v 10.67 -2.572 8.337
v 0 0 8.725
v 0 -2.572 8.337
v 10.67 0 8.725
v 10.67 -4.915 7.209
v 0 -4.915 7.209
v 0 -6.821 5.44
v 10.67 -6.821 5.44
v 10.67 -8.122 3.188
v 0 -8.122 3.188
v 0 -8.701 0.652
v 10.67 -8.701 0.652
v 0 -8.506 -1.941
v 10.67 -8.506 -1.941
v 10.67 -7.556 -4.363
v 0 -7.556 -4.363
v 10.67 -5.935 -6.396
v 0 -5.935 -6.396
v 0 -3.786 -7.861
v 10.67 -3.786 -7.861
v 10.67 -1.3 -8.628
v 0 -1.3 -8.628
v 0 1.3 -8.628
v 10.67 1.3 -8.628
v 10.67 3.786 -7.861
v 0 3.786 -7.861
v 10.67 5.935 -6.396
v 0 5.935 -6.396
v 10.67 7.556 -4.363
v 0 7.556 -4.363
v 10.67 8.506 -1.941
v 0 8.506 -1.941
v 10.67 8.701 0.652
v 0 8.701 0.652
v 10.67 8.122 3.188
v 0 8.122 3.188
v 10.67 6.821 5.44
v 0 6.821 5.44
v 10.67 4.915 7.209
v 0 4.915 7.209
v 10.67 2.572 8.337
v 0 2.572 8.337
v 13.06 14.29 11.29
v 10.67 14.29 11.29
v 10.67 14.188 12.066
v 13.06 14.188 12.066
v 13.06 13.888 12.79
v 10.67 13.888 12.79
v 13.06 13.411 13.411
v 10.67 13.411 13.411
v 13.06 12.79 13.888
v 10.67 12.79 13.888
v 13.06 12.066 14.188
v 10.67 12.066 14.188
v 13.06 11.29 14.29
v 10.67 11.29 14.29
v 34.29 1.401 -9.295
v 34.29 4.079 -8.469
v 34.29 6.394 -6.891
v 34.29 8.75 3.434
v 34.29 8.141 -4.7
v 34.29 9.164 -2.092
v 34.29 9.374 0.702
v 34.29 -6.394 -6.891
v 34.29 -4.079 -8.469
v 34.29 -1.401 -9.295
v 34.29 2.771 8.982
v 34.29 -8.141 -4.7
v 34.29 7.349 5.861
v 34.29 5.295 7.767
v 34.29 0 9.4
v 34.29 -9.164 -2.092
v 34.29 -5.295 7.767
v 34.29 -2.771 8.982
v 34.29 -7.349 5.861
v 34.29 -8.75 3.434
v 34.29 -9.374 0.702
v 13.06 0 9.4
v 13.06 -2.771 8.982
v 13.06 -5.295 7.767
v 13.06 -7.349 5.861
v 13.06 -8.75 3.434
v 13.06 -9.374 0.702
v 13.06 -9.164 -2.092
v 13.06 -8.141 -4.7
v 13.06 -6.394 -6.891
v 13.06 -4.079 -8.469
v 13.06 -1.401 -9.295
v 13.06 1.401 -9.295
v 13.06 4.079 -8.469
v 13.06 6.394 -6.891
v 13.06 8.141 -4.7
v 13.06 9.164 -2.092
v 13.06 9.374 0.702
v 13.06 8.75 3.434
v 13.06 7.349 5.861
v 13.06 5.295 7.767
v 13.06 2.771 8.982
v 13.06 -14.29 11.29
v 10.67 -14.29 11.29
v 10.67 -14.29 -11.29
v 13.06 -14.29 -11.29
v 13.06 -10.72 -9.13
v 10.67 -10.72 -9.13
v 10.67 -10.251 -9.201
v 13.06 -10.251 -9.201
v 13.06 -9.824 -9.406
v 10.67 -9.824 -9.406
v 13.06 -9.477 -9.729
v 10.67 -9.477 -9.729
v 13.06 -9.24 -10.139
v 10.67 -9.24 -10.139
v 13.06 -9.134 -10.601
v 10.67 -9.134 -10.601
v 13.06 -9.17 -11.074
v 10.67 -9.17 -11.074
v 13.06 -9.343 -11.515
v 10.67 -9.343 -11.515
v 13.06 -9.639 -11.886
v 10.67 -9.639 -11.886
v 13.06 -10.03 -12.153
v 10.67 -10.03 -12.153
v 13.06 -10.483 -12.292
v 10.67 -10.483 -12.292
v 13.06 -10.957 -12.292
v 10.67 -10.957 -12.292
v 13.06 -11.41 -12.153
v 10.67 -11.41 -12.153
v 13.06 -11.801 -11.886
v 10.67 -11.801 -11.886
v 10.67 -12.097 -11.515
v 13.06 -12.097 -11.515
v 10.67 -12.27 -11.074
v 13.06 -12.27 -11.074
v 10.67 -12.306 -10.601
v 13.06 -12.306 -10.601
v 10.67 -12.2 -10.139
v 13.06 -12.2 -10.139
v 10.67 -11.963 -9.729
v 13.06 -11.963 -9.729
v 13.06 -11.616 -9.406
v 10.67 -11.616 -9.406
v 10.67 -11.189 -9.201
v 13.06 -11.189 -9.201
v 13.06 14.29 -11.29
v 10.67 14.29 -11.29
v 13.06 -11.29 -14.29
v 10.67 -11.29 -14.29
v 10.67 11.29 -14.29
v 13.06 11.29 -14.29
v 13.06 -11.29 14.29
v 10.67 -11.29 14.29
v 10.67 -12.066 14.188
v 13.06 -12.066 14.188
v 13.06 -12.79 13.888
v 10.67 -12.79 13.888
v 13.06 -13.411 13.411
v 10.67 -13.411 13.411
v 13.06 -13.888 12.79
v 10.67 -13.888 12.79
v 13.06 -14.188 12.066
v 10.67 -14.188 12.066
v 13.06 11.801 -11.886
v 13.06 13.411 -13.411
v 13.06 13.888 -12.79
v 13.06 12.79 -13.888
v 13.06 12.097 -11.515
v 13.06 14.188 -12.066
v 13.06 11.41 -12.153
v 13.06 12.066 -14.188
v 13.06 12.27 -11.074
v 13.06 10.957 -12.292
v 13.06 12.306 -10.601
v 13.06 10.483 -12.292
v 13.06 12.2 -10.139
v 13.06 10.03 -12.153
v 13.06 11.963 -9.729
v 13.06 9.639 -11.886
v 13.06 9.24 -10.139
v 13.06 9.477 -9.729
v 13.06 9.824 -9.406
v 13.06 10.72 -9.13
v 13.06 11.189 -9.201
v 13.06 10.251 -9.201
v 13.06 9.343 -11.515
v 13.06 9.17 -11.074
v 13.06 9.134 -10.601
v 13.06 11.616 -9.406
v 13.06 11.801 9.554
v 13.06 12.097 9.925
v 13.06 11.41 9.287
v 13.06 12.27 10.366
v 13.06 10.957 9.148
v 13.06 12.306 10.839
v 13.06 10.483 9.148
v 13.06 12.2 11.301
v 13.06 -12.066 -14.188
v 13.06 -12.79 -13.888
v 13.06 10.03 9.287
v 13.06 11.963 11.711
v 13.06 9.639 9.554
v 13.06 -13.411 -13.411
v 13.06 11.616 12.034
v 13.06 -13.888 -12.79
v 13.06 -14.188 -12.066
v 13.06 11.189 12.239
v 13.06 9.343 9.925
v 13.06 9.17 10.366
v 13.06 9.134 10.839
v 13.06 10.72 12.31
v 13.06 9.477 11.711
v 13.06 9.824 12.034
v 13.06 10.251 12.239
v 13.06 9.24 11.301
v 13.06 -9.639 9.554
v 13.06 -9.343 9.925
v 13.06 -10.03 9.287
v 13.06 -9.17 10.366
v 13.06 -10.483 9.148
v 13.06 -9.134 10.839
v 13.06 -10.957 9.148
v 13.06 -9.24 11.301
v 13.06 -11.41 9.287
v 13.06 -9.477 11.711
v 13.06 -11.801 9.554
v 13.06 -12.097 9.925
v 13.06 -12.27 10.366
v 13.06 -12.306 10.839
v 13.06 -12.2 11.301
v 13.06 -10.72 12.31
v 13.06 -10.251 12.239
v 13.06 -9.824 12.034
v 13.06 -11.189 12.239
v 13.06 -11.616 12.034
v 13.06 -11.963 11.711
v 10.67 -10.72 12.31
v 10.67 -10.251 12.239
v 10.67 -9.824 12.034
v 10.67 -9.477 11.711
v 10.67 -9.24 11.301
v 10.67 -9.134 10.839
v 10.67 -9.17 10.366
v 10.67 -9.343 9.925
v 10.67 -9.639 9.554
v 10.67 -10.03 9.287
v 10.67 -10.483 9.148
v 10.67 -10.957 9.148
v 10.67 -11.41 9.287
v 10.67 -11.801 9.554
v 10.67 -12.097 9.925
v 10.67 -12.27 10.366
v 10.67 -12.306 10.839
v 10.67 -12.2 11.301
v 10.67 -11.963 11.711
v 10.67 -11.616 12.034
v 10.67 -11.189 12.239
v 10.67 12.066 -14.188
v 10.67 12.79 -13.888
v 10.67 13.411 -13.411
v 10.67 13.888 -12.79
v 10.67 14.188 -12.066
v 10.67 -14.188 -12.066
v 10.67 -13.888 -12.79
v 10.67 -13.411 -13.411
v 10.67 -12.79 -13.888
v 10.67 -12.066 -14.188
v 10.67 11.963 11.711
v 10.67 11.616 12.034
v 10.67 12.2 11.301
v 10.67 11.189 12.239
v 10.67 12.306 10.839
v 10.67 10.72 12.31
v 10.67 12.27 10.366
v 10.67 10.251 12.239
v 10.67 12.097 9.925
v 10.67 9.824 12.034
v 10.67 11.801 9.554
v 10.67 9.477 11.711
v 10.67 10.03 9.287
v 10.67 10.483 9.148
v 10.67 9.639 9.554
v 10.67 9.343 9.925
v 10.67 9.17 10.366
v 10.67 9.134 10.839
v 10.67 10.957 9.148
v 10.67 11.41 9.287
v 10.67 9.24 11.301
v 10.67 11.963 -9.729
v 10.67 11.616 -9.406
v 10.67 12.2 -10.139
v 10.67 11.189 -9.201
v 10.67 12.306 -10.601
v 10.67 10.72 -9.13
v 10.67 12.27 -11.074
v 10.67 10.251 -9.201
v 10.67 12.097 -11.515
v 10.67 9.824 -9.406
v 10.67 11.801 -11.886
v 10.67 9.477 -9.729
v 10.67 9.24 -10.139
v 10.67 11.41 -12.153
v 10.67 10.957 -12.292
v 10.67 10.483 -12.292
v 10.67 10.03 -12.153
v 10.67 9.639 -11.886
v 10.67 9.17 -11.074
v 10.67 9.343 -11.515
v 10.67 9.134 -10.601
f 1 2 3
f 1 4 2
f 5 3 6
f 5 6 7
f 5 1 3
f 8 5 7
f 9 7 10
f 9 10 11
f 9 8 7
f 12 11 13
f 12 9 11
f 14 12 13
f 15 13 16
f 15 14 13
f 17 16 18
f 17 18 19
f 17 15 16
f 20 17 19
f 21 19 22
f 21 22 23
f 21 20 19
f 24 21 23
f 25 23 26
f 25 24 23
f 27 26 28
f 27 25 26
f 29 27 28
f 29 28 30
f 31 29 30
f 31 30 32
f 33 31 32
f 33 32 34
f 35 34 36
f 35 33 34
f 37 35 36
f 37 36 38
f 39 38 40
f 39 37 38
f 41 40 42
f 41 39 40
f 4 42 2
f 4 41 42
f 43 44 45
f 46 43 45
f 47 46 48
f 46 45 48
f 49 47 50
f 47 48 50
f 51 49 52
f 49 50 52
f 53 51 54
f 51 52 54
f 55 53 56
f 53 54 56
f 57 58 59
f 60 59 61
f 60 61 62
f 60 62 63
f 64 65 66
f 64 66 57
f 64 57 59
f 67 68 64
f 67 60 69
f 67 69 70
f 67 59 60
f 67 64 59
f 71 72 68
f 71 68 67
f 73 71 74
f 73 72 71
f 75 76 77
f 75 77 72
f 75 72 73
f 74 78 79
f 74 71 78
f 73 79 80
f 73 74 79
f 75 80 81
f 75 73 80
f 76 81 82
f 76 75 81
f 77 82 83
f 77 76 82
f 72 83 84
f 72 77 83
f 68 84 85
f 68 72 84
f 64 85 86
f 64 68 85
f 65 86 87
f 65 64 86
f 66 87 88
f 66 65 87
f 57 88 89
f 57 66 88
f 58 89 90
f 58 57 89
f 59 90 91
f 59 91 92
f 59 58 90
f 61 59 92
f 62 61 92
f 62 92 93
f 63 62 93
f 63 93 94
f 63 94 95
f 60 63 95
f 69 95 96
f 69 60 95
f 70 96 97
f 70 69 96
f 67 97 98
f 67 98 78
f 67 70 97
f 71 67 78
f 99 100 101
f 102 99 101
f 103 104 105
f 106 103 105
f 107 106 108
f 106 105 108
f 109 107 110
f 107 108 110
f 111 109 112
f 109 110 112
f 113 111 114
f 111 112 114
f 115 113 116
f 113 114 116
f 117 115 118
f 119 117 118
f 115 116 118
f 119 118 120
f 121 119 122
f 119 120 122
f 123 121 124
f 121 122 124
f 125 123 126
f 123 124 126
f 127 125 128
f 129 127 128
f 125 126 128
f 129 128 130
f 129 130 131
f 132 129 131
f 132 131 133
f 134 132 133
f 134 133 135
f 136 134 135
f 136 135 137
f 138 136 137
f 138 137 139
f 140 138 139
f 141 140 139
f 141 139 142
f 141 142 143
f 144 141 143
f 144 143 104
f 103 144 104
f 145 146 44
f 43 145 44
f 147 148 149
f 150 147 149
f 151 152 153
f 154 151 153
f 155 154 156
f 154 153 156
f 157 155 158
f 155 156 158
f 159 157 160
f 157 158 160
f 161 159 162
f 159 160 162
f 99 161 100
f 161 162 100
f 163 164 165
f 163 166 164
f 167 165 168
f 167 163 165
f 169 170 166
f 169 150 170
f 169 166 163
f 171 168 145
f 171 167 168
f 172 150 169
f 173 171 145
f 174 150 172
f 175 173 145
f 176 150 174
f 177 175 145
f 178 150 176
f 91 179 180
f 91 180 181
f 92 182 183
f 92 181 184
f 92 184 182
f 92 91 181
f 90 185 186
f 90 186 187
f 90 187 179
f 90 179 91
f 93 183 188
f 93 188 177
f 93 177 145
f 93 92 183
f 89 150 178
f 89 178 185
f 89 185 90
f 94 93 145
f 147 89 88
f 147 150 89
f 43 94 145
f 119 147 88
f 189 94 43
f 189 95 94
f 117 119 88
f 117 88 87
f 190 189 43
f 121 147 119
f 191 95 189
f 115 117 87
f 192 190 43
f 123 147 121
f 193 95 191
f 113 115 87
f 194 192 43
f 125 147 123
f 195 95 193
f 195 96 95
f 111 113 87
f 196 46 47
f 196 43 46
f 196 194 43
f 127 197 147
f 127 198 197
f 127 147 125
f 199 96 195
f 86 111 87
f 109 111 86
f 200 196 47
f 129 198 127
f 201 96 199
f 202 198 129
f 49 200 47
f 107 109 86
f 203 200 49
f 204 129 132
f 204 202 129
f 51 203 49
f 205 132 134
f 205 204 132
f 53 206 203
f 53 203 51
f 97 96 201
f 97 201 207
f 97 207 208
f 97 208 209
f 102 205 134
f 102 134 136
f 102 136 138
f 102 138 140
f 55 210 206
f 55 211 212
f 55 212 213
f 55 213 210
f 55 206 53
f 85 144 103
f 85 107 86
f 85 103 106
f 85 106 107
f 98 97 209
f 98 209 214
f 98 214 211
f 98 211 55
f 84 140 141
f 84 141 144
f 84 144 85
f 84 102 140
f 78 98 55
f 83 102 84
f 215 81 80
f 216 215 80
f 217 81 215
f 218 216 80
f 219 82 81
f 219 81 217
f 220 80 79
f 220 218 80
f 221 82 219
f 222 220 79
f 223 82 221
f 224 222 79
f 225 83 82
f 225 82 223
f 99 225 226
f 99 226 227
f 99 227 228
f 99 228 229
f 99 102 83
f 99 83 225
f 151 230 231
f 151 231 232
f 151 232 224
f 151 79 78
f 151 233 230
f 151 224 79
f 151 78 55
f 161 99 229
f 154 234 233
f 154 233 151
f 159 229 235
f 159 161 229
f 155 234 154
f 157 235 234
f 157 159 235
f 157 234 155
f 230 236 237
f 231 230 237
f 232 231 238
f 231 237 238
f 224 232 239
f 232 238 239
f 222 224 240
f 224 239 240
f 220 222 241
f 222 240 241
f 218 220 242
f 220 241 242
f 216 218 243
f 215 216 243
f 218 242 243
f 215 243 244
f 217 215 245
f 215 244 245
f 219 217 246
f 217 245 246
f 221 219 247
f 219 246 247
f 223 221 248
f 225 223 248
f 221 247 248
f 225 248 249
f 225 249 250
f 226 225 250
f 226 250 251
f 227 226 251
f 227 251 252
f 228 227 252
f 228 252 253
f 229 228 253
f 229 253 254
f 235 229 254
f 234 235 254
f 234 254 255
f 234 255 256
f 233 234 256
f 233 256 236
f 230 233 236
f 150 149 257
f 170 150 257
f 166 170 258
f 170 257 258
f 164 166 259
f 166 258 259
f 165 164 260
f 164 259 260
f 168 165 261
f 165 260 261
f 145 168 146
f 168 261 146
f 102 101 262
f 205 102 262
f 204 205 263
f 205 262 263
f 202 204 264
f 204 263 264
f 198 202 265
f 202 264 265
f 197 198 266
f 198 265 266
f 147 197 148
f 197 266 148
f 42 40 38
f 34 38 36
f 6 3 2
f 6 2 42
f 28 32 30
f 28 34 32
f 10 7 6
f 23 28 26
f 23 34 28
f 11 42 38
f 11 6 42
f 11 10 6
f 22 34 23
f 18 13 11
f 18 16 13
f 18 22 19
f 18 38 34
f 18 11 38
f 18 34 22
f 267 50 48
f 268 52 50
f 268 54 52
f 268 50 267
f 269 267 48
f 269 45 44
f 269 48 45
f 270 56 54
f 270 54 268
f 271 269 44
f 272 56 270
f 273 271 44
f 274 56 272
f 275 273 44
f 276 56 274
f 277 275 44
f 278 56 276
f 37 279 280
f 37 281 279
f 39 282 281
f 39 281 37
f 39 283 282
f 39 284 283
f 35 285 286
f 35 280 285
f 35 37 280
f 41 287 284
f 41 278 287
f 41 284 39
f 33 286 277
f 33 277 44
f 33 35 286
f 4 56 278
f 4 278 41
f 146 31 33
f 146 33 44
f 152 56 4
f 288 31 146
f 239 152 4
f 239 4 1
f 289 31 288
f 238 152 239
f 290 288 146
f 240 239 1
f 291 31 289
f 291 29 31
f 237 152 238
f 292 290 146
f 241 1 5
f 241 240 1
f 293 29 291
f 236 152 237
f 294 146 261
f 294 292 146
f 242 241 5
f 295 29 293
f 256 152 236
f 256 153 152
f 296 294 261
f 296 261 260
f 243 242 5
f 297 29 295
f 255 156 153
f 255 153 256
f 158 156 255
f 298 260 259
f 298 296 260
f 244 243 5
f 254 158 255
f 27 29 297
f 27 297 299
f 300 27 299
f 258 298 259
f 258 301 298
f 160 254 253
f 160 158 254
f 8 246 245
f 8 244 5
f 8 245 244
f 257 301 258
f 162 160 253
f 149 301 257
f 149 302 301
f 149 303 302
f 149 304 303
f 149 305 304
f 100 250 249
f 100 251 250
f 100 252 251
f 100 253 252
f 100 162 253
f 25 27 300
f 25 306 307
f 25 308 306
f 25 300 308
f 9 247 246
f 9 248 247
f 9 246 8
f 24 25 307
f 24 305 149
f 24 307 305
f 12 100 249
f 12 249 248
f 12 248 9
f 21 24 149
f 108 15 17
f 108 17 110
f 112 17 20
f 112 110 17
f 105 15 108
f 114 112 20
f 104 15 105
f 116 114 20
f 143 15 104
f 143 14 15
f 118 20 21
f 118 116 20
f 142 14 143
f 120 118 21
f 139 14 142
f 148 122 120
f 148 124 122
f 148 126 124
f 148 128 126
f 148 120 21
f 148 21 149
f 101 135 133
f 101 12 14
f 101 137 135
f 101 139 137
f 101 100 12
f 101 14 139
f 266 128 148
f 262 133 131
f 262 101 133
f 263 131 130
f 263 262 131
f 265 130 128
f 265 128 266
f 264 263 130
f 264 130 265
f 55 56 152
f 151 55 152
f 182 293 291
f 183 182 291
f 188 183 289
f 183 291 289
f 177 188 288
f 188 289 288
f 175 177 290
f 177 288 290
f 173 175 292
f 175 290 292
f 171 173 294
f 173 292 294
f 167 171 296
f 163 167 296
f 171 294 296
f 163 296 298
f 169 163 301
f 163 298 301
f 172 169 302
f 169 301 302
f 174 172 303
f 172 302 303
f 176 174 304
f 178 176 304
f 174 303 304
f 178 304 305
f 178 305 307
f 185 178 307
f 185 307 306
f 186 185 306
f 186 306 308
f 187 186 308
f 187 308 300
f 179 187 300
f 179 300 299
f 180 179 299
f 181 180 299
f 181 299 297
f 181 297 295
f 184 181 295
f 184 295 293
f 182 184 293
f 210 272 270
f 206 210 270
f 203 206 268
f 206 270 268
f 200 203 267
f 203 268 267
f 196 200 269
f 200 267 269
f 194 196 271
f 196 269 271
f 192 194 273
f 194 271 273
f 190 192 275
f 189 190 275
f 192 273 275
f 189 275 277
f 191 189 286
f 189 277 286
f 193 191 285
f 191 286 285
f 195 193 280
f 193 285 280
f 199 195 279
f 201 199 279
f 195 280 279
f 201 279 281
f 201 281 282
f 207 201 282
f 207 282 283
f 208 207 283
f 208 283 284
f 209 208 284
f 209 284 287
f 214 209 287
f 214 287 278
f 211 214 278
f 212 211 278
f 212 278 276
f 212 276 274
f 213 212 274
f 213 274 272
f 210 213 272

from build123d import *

# Parameters (mm, degrees)
SKETCH2_OUTSIDE_W  = 80.304
SKETCH2_OUTSIDE_H  = 80.304
SKETCH2_OUTSIDE_R  = 1.59
CUT_EXTRUDE1_DEPTH = 24.62


with BuildPart() as part:
    # Sketch1 → Revolve1 (revolve)
    with BuildSketch(Plane.XY, mode=Mode.PRIVATE) as revolve1_sk:
        Polygon((0, 0), (0, 8.725), (10.67, 8.725), (10.67, 30), (13.06, 30), (13.06, 9.4), (34.29, 9.4), (34.29, 0), align=None)
    revolve(revolve1_sk.sketch.rotate(Axis((0, 0, 0), (1, 0, 0)), 90), axis=Axis((0, 0, 0), (1, 0, 0)))  # turned: the seam where the file's is

    # Sketch2 outside → Cut-Extrude1 (cut, through all)
    with BuildSketch(Plane.ZY.offset(-10.67)):
        Rectangle(SKETCH2_OUTSIDE_W, SKETCH2_OUTSIDE_H)
        with BuildLine():
            Line((-11.29, 14.29), (11.29, 14.29))
            ThreePointArc((11.29, 14.29), (13.411320344, 13.411320344), (14.29, 11.29))
            Line((14.29, 11.29), (14.29, -11.29))
            ThreePointArc((14.29, -11.29), (13.411320344, -13.411320344), (11.29, -14.29))
            Line((11.29, -14.29), (-11.29, -14.29))
            ThreePointArc((-11.29, -14.29), (-13.411320344, -13.411320344), (-14.29, -11.29))
            Line((-14.29, -11.29), (-14.29, 11.29))
            ThreePointArc((-14.29, 11.29), (-13.411320344, 13.411320344), (-11.29, 14.29))
        make_face(mode=Mode.SUBTRACT)
        with Locations((10.72, 10.72)):
            Circle(SKETCH2_OUTSIDE_R)
        with Locations((-10.72, 10.72)):
            Circle(SKETCH2_OUTSIDE_R)
        with Locations((-10.72, -10.72)):
            Circle(SKETCH2_OUTSIDE_R)
        with Locations((10.72, -10.72)):
            Circle(SKETCH2_OUTSIDE_R)
    extrude(amount=-CUT_EXTRUDE1_DEPTH, mode=Mode.SUBTRACT)


solid = part.part
